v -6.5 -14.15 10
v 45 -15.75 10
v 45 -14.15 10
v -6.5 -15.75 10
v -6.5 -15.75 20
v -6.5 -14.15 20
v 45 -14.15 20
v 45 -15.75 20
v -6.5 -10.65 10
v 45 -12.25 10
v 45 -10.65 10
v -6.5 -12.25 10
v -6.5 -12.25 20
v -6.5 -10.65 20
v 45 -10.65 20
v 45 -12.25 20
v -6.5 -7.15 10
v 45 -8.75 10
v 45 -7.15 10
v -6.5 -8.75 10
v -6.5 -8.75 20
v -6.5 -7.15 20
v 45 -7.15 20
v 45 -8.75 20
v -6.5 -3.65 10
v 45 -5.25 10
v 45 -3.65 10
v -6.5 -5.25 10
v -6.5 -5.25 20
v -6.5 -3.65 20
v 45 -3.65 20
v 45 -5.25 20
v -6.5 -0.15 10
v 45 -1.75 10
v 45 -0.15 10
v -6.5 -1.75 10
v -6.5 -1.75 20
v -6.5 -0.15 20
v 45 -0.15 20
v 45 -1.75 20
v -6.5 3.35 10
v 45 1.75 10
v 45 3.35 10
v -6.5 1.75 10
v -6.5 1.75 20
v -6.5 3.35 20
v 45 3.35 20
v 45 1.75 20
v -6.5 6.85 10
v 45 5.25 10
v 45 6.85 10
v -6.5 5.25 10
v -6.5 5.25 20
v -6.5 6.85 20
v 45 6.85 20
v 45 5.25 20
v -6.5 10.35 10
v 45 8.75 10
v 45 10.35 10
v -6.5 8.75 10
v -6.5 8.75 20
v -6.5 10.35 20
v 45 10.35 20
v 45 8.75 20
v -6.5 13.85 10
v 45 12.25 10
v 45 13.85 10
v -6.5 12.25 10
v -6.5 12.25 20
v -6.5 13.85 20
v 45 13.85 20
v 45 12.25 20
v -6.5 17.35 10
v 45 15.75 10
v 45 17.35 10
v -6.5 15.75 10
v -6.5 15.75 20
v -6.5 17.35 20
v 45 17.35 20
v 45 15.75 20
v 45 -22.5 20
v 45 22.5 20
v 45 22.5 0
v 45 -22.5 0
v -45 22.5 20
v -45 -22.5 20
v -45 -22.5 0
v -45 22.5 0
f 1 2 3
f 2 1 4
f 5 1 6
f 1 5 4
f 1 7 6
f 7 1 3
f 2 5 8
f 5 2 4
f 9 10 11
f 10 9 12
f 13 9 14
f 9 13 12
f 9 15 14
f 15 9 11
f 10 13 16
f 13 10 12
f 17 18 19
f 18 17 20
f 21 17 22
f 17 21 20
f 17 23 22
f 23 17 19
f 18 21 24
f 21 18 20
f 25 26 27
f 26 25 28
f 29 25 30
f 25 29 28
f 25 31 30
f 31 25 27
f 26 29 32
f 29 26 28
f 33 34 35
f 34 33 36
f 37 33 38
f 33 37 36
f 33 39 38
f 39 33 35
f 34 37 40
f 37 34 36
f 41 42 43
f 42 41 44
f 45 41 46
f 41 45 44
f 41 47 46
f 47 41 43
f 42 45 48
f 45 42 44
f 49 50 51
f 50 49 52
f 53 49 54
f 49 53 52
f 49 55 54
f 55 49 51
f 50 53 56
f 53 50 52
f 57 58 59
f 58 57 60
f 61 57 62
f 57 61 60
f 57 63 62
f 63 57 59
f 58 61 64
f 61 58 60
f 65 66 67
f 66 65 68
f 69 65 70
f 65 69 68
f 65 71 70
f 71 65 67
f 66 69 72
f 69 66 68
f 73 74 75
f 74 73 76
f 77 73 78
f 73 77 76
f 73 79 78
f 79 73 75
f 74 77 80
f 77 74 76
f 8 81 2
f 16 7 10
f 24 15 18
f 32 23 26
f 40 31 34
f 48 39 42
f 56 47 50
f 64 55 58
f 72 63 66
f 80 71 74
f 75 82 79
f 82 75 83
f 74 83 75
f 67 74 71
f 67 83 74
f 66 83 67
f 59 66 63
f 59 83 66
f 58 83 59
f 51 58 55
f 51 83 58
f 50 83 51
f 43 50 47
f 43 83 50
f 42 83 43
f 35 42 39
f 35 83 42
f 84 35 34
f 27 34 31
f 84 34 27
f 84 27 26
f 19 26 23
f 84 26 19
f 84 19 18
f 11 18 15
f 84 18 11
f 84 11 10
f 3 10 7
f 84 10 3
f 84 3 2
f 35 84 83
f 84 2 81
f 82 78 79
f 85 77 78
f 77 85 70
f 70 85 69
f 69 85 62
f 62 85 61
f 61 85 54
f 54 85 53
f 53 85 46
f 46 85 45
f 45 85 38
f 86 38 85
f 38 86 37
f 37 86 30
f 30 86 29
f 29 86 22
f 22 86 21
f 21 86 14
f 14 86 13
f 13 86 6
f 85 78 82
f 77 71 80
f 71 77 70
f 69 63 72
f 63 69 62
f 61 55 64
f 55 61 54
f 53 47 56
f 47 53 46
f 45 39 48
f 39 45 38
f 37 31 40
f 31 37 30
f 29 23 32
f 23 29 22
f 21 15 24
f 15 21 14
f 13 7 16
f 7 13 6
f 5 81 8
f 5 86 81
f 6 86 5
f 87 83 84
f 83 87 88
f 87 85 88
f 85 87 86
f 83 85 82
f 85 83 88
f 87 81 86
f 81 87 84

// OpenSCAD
// Slides drying rack
// Print orientation: base block on XY plane, slots open upward (+Z)

// ---------- Block ----------
block_l = 90;    // block length along X (mm)
block_w = 45;    // block width along Y (mm)
block_h = 20;    // block height along Z (mm)

// ---------- Slots ----------
slot_n     = 10;   // number of slide slots
slot_len   = 77;   // slot length along X (mm)
slot_w     = 1.6;  // slot width along Y (mm)
slot_d     = 10;   // slot depth from top face (mm)
slot_pitch = 3.5;  // centre-to-centre spacing along Y (mm)

// ---------- Misc ----------
eps = 0.5;       // overcut past faces to avoid coplanar surfaces
$fn = 64;        // curve resolution (no curves used, kept per convention)

// X position of first slot so the group is centred on the block
slot_x0 = -(block_l - slot_len) / 2;

difference() {
    // Base block
    translate([-block_l / 2, -block_w / 2, 0])
        cube([block_l, block_w, block_h]);

    // Parallel slots running along X, centred in X and Y
    for (i = [0 : slot_n - 1]) {
        translate([slot_x0,
                   (i - (slot_n - 1) / 2) * slot_pitch,
                   block_h - slot_d])
            cube([slot_len, slot_w, slot_d + eps]);
    }
}
